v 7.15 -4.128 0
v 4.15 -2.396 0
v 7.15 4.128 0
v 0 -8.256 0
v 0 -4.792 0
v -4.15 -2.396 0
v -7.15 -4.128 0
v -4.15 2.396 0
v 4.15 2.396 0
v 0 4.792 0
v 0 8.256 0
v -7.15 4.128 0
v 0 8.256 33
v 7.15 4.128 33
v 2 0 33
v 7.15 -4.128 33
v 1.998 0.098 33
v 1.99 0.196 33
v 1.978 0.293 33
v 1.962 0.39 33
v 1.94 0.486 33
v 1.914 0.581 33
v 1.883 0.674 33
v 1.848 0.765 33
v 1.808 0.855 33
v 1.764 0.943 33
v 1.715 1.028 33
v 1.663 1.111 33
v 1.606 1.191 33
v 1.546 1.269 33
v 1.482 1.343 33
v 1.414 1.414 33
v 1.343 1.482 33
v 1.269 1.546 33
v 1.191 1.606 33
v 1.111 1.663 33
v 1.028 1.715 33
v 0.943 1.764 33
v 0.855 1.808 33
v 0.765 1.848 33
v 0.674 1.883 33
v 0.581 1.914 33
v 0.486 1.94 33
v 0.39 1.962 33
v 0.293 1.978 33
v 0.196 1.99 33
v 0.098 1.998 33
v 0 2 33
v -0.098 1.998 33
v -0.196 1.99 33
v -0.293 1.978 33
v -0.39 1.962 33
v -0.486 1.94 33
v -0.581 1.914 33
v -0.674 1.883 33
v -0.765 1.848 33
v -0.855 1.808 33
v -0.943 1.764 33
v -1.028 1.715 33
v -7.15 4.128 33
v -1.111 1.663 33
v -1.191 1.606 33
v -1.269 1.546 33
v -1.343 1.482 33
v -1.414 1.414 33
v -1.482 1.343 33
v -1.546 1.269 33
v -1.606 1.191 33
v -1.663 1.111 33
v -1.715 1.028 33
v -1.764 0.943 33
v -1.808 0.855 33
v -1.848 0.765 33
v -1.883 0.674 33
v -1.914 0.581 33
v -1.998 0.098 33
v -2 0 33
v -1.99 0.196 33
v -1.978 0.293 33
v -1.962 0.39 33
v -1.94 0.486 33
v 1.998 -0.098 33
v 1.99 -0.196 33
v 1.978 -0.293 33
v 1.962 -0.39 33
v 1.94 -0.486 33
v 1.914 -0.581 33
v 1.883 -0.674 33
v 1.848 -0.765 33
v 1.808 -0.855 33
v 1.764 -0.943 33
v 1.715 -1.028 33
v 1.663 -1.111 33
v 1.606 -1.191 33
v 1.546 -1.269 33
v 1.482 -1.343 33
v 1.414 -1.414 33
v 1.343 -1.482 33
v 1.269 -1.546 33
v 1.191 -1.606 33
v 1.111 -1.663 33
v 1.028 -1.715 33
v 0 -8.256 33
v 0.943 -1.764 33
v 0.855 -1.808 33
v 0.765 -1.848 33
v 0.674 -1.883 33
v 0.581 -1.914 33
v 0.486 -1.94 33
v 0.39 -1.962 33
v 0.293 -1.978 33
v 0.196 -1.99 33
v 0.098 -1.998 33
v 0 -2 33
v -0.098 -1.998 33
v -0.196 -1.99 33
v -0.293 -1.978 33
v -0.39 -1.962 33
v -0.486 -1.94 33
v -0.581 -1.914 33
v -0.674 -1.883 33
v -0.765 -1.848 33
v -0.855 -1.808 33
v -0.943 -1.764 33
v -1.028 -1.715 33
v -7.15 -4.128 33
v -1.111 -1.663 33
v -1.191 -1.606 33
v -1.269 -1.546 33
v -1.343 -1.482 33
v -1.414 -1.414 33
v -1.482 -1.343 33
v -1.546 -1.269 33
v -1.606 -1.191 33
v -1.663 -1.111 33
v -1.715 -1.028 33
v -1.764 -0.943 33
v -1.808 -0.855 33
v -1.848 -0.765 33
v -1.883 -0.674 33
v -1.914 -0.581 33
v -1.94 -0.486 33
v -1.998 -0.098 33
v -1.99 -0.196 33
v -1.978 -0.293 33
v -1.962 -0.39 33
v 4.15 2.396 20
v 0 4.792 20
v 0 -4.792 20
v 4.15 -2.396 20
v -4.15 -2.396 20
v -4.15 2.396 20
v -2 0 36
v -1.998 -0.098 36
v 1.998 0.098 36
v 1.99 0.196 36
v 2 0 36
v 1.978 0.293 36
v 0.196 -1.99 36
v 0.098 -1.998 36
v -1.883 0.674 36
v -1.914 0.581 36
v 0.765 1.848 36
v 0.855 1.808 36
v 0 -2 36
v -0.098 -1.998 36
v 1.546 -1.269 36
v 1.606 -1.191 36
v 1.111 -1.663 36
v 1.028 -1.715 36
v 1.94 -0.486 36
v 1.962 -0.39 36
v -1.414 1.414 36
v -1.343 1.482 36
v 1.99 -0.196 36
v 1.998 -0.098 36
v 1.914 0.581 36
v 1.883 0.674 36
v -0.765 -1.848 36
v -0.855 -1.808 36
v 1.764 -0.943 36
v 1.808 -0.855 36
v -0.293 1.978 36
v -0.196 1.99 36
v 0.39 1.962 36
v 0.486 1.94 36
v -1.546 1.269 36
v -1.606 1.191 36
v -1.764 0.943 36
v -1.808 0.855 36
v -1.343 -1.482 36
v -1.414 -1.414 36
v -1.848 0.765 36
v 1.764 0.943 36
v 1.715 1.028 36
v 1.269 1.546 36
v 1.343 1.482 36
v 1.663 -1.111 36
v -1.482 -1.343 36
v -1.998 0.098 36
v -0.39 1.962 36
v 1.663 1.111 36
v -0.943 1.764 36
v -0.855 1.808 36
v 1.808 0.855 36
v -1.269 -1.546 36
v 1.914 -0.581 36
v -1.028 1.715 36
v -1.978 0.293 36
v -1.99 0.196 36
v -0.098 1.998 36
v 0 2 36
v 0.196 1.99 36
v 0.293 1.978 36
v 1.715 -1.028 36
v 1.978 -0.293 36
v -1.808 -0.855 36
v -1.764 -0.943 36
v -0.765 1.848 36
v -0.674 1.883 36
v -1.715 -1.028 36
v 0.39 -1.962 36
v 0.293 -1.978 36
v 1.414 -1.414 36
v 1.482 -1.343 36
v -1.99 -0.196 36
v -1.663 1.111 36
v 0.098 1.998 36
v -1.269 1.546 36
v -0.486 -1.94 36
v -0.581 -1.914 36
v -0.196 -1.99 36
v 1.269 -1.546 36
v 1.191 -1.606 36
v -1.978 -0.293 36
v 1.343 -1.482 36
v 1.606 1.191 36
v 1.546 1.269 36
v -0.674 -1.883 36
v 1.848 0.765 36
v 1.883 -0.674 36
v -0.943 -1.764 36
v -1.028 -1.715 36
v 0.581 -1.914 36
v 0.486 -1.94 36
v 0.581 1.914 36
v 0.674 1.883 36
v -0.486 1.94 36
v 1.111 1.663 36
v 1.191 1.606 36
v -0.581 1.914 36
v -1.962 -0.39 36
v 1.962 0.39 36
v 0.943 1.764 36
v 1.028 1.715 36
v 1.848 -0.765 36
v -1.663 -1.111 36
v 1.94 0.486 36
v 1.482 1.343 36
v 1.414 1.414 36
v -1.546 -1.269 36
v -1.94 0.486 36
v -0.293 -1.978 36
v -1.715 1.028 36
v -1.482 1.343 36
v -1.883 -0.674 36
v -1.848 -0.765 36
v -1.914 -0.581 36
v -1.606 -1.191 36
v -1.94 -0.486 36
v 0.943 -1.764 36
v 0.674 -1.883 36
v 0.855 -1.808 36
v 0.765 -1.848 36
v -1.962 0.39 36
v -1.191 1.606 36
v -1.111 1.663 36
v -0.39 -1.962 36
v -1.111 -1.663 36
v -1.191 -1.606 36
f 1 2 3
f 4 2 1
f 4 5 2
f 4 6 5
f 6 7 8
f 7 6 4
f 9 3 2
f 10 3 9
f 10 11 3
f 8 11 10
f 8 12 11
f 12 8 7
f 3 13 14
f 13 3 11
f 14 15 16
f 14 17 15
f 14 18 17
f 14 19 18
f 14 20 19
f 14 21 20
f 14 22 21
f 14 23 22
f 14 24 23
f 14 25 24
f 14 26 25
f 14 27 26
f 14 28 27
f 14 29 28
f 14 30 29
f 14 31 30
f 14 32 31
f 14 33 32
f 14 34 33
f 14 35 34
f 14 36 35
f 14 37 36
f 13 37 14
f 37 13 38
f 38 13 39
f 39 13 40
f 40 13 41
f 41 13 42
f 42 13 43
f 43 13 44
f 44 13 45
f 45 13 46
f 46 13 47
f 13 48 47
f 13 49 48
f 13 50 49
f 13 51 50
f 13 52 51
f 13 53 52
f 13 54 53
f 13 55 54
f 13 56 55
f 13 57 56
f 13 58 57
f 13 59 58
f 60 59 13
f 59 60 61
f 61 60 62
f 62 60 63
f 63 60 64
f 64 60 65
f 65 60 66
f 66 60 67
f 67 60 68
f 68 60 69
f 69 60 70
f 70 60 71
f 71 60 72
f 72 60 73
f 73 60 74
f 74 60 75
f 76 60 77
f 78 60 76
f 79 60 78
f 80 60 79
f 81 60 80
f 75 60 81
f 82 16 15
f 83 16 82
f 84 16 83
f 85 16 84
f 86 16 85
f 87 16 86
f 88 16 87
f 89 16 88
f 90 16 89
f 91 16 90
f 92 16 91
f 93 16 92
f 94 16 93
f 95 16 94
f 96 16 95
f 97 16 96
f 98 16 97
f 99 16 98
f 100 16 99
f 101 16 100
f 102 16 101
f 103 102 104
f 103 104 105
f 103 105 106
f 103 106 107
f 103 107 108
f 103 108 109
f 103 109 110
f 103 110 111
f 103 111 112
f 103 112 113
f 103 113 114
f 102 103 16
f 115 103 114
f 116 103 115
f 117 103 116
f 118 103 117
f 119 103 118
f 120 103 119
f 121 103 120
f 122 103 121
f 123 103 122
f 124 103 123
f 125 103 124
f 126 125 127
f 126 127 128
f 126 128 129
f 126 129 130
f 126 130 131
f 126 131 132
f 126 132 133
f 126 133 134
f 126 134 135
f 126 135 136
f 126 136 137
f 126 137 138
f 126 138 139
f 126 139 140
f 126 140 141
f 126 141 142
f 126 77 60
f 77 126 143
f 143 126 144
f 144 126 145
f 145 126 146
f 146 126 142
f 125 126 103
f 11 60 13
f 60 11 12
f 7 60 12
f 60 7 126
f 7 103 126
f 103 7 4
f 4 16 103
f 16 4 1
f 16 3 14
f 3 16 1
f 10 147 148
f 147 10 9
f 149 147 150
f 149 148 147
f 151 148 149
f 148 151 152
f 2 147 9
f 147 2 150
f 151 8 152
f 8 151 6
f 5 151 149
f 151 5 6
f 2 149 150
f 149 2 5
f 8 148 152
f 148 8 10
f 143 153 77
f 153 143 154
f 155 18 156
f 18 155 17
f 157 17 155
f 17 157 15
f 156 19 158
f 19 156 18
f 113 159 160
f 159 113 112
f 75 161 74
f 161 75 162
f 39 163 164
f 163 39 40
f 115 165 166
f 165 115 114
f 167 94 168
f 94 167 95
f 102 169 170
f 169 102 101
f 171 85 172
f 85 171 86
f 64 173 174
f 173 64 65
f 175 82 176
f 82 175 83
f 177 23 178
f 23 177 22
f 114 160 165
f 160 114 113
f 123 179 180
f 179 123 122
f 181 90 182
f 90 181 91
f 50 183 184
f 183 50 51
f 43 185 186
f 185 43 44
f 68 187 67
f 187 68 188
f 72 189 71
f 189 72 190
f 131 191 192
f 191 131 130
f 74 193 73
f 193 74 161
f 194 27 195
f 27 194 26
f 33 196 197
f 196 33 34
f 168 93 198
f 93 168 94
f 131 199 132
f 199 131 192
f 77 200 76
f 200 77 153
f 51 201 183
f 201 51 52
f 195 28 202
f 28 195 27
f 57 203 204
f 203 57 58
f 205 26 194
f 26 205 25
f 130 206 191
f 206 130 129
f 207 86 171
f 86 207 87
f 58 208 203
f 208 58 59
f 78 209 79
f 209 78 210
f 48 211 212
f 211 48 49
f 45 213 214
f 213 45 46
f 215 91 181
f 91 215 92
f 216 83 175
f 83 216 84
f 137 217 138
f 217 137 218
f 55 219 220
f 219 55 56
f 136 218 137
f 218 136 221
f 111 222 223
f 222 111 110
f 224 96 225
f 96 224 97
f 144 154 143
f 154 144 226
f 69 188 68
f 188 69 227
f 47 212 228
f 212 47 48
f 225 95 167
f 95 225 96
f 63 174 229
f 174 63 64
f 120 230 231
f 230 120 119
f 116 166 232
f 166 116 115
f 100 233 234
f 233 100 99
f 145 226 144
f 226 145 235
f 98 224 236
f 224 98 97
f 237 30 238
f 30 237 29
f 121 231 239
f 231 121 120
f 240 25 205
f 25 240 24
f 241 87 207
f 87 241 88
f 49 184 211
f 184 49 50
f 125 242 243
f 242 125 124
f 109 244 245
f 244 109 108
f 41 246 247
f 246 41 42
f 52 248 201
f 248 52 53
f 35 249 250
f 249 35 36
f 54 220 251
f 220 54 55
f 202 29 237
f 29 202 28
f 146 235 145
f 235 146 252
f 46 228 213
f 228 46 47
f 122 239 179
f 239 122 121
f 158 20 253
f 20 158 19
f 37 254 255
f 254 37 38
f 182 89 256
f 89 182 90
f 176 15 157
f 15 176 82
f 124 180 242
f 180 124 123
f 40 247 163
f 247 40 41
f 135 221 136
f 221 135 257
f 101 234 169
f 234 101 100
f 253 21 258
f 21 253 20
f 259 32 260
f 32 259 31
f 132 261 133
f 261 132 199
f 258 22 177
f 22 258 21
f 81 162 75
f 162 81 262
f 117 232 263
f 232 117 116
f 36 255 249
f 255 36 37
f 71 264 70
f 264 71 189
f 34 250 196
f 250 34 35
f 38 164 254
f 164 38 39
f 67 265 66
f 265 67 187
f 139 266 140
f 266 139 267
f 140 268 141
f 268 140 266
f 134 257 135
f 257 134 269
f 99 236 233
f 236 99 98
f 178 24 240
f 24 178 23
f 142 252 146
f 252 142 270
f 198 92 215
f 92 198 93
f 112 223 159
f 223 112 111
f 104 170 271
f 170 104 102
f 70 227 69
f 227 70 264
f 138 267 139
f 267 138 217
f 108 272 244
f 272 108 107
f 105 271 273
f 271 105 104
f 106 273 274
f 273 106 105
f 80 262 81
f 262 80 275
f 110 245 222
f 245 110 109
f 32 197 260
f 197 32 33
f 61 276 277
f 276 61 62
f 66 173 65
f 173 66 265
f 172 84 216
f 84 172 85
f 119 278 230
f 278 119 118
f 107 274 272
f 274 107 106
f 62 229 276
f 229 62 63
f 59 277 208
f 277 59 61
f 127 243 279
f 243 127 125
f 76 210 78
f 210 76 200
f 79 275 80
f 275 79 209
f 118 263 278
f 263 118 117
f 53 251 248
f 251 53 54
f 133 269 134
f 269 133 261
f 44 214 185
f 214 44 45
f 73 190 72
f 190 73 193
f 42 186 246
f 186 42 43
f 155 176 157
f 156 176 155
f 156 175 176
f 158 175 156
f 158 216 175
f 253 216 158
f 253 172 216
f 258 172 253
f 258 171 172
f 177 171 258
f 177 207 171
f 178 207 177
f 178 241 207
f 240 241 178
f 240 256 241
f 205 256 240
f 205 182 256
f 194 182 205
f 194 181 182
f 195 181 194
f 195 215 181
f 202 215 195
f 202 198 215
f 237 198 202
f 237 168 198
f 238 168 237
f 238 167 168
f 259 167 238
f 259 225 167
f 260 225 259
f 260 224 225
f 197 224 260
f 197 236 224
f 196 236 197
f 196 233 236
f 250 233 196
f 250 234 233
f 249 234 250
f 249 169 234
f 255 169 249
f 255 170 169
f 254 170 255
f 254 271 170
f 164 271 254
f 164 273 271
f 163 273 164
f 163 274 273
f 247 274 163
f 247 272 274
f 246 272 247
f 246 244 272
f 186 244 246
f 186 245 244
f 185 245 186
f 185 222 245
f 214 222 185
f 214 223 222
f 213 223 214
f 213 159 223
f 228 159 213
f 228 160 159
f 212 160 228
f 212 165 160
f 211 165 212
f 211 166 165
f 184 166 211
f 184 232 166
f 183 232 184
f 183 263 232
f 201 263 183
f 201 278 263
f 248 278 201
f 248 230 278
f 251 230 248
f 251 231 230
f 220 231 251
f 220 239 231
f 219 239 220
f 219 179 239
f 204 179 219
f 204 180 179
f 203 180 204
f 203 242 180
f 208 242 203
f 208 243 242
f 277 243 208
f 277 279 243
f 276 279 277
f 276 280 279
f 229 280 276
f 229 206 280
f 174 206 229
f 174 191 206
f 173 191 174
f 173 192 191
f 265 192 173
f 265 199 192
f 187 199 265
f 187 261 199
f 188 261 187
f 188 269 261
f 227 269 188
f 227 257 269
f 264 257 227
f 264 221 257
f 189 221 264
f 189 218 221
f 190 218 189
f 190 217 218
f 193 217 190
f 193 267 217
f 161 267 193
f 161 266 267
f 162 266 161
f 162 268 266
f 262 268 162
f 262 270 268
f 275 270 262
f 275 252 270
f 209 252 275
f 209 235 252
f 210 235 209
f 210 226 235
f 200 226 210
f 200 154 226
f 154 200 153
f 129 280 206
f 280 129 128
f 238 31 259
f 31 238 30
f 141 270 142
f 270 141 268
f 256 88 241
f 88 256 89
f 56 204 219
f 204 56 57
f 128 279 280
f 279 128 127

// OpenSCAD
// file: config.scad
$fn = 128;


module hexagon(width) {
	diagonal = width * tan(30) + (width / 2) / cos(30);
	polygon(points = [
		[0, diagonal / 2],
		[width / 2,  width * tan(30) / 2],
		[width / 2, -width * tan(30) / 2],
		[0, -diagonal / 2],
		[-width / 2, -width * tan(30) / 2],
		[-width / 2,  width * tan(30) / 2],
	]);
}

switch_width = 14.5;
switch_height = 8;

bolt_hole_radius = 2.05;

bolt_hex_width = 8.3;
bolt_hex_length = 20;
bolt_mount_thickness = 3; 
bolt_mount_width = bolt_hex_width + bolt_mount_thickness * 2;
bolt_cap = 3;

laser_inset = 10;

radius_pinhole = 12.5;
pinhole_insert_thickness = 3.5;
pinhole_insert_height = 15;
pinhole_insert_insert_depth = 3;

led_mount_thickness = 15;
led_board_thickness = 5.5;
led_board_width = 11;
led_board_height = 16;

bolt_insert_radius = led_mount_thickness / 3 - pinhole_insert_insert_depth;
bolt_insert_depth = 3;
// main file
include <config.scad>


module bolt_mount() {
	difference() {
		linear_extrude(bolt_hex_length + bolt_cap + laser_inset) hexagon(bolt_mount_width);	
		linear_extrude(bolt_hex_length)            hexagon(bolt_hex_width);
	}
	
	translate([0, 0, bolt_hex_length + bolt_cap + laser_inset]) cylinder(bolt_insert_depth, bolt_insert_radius, bolt_insert_radius);
}

bolt_mount();
